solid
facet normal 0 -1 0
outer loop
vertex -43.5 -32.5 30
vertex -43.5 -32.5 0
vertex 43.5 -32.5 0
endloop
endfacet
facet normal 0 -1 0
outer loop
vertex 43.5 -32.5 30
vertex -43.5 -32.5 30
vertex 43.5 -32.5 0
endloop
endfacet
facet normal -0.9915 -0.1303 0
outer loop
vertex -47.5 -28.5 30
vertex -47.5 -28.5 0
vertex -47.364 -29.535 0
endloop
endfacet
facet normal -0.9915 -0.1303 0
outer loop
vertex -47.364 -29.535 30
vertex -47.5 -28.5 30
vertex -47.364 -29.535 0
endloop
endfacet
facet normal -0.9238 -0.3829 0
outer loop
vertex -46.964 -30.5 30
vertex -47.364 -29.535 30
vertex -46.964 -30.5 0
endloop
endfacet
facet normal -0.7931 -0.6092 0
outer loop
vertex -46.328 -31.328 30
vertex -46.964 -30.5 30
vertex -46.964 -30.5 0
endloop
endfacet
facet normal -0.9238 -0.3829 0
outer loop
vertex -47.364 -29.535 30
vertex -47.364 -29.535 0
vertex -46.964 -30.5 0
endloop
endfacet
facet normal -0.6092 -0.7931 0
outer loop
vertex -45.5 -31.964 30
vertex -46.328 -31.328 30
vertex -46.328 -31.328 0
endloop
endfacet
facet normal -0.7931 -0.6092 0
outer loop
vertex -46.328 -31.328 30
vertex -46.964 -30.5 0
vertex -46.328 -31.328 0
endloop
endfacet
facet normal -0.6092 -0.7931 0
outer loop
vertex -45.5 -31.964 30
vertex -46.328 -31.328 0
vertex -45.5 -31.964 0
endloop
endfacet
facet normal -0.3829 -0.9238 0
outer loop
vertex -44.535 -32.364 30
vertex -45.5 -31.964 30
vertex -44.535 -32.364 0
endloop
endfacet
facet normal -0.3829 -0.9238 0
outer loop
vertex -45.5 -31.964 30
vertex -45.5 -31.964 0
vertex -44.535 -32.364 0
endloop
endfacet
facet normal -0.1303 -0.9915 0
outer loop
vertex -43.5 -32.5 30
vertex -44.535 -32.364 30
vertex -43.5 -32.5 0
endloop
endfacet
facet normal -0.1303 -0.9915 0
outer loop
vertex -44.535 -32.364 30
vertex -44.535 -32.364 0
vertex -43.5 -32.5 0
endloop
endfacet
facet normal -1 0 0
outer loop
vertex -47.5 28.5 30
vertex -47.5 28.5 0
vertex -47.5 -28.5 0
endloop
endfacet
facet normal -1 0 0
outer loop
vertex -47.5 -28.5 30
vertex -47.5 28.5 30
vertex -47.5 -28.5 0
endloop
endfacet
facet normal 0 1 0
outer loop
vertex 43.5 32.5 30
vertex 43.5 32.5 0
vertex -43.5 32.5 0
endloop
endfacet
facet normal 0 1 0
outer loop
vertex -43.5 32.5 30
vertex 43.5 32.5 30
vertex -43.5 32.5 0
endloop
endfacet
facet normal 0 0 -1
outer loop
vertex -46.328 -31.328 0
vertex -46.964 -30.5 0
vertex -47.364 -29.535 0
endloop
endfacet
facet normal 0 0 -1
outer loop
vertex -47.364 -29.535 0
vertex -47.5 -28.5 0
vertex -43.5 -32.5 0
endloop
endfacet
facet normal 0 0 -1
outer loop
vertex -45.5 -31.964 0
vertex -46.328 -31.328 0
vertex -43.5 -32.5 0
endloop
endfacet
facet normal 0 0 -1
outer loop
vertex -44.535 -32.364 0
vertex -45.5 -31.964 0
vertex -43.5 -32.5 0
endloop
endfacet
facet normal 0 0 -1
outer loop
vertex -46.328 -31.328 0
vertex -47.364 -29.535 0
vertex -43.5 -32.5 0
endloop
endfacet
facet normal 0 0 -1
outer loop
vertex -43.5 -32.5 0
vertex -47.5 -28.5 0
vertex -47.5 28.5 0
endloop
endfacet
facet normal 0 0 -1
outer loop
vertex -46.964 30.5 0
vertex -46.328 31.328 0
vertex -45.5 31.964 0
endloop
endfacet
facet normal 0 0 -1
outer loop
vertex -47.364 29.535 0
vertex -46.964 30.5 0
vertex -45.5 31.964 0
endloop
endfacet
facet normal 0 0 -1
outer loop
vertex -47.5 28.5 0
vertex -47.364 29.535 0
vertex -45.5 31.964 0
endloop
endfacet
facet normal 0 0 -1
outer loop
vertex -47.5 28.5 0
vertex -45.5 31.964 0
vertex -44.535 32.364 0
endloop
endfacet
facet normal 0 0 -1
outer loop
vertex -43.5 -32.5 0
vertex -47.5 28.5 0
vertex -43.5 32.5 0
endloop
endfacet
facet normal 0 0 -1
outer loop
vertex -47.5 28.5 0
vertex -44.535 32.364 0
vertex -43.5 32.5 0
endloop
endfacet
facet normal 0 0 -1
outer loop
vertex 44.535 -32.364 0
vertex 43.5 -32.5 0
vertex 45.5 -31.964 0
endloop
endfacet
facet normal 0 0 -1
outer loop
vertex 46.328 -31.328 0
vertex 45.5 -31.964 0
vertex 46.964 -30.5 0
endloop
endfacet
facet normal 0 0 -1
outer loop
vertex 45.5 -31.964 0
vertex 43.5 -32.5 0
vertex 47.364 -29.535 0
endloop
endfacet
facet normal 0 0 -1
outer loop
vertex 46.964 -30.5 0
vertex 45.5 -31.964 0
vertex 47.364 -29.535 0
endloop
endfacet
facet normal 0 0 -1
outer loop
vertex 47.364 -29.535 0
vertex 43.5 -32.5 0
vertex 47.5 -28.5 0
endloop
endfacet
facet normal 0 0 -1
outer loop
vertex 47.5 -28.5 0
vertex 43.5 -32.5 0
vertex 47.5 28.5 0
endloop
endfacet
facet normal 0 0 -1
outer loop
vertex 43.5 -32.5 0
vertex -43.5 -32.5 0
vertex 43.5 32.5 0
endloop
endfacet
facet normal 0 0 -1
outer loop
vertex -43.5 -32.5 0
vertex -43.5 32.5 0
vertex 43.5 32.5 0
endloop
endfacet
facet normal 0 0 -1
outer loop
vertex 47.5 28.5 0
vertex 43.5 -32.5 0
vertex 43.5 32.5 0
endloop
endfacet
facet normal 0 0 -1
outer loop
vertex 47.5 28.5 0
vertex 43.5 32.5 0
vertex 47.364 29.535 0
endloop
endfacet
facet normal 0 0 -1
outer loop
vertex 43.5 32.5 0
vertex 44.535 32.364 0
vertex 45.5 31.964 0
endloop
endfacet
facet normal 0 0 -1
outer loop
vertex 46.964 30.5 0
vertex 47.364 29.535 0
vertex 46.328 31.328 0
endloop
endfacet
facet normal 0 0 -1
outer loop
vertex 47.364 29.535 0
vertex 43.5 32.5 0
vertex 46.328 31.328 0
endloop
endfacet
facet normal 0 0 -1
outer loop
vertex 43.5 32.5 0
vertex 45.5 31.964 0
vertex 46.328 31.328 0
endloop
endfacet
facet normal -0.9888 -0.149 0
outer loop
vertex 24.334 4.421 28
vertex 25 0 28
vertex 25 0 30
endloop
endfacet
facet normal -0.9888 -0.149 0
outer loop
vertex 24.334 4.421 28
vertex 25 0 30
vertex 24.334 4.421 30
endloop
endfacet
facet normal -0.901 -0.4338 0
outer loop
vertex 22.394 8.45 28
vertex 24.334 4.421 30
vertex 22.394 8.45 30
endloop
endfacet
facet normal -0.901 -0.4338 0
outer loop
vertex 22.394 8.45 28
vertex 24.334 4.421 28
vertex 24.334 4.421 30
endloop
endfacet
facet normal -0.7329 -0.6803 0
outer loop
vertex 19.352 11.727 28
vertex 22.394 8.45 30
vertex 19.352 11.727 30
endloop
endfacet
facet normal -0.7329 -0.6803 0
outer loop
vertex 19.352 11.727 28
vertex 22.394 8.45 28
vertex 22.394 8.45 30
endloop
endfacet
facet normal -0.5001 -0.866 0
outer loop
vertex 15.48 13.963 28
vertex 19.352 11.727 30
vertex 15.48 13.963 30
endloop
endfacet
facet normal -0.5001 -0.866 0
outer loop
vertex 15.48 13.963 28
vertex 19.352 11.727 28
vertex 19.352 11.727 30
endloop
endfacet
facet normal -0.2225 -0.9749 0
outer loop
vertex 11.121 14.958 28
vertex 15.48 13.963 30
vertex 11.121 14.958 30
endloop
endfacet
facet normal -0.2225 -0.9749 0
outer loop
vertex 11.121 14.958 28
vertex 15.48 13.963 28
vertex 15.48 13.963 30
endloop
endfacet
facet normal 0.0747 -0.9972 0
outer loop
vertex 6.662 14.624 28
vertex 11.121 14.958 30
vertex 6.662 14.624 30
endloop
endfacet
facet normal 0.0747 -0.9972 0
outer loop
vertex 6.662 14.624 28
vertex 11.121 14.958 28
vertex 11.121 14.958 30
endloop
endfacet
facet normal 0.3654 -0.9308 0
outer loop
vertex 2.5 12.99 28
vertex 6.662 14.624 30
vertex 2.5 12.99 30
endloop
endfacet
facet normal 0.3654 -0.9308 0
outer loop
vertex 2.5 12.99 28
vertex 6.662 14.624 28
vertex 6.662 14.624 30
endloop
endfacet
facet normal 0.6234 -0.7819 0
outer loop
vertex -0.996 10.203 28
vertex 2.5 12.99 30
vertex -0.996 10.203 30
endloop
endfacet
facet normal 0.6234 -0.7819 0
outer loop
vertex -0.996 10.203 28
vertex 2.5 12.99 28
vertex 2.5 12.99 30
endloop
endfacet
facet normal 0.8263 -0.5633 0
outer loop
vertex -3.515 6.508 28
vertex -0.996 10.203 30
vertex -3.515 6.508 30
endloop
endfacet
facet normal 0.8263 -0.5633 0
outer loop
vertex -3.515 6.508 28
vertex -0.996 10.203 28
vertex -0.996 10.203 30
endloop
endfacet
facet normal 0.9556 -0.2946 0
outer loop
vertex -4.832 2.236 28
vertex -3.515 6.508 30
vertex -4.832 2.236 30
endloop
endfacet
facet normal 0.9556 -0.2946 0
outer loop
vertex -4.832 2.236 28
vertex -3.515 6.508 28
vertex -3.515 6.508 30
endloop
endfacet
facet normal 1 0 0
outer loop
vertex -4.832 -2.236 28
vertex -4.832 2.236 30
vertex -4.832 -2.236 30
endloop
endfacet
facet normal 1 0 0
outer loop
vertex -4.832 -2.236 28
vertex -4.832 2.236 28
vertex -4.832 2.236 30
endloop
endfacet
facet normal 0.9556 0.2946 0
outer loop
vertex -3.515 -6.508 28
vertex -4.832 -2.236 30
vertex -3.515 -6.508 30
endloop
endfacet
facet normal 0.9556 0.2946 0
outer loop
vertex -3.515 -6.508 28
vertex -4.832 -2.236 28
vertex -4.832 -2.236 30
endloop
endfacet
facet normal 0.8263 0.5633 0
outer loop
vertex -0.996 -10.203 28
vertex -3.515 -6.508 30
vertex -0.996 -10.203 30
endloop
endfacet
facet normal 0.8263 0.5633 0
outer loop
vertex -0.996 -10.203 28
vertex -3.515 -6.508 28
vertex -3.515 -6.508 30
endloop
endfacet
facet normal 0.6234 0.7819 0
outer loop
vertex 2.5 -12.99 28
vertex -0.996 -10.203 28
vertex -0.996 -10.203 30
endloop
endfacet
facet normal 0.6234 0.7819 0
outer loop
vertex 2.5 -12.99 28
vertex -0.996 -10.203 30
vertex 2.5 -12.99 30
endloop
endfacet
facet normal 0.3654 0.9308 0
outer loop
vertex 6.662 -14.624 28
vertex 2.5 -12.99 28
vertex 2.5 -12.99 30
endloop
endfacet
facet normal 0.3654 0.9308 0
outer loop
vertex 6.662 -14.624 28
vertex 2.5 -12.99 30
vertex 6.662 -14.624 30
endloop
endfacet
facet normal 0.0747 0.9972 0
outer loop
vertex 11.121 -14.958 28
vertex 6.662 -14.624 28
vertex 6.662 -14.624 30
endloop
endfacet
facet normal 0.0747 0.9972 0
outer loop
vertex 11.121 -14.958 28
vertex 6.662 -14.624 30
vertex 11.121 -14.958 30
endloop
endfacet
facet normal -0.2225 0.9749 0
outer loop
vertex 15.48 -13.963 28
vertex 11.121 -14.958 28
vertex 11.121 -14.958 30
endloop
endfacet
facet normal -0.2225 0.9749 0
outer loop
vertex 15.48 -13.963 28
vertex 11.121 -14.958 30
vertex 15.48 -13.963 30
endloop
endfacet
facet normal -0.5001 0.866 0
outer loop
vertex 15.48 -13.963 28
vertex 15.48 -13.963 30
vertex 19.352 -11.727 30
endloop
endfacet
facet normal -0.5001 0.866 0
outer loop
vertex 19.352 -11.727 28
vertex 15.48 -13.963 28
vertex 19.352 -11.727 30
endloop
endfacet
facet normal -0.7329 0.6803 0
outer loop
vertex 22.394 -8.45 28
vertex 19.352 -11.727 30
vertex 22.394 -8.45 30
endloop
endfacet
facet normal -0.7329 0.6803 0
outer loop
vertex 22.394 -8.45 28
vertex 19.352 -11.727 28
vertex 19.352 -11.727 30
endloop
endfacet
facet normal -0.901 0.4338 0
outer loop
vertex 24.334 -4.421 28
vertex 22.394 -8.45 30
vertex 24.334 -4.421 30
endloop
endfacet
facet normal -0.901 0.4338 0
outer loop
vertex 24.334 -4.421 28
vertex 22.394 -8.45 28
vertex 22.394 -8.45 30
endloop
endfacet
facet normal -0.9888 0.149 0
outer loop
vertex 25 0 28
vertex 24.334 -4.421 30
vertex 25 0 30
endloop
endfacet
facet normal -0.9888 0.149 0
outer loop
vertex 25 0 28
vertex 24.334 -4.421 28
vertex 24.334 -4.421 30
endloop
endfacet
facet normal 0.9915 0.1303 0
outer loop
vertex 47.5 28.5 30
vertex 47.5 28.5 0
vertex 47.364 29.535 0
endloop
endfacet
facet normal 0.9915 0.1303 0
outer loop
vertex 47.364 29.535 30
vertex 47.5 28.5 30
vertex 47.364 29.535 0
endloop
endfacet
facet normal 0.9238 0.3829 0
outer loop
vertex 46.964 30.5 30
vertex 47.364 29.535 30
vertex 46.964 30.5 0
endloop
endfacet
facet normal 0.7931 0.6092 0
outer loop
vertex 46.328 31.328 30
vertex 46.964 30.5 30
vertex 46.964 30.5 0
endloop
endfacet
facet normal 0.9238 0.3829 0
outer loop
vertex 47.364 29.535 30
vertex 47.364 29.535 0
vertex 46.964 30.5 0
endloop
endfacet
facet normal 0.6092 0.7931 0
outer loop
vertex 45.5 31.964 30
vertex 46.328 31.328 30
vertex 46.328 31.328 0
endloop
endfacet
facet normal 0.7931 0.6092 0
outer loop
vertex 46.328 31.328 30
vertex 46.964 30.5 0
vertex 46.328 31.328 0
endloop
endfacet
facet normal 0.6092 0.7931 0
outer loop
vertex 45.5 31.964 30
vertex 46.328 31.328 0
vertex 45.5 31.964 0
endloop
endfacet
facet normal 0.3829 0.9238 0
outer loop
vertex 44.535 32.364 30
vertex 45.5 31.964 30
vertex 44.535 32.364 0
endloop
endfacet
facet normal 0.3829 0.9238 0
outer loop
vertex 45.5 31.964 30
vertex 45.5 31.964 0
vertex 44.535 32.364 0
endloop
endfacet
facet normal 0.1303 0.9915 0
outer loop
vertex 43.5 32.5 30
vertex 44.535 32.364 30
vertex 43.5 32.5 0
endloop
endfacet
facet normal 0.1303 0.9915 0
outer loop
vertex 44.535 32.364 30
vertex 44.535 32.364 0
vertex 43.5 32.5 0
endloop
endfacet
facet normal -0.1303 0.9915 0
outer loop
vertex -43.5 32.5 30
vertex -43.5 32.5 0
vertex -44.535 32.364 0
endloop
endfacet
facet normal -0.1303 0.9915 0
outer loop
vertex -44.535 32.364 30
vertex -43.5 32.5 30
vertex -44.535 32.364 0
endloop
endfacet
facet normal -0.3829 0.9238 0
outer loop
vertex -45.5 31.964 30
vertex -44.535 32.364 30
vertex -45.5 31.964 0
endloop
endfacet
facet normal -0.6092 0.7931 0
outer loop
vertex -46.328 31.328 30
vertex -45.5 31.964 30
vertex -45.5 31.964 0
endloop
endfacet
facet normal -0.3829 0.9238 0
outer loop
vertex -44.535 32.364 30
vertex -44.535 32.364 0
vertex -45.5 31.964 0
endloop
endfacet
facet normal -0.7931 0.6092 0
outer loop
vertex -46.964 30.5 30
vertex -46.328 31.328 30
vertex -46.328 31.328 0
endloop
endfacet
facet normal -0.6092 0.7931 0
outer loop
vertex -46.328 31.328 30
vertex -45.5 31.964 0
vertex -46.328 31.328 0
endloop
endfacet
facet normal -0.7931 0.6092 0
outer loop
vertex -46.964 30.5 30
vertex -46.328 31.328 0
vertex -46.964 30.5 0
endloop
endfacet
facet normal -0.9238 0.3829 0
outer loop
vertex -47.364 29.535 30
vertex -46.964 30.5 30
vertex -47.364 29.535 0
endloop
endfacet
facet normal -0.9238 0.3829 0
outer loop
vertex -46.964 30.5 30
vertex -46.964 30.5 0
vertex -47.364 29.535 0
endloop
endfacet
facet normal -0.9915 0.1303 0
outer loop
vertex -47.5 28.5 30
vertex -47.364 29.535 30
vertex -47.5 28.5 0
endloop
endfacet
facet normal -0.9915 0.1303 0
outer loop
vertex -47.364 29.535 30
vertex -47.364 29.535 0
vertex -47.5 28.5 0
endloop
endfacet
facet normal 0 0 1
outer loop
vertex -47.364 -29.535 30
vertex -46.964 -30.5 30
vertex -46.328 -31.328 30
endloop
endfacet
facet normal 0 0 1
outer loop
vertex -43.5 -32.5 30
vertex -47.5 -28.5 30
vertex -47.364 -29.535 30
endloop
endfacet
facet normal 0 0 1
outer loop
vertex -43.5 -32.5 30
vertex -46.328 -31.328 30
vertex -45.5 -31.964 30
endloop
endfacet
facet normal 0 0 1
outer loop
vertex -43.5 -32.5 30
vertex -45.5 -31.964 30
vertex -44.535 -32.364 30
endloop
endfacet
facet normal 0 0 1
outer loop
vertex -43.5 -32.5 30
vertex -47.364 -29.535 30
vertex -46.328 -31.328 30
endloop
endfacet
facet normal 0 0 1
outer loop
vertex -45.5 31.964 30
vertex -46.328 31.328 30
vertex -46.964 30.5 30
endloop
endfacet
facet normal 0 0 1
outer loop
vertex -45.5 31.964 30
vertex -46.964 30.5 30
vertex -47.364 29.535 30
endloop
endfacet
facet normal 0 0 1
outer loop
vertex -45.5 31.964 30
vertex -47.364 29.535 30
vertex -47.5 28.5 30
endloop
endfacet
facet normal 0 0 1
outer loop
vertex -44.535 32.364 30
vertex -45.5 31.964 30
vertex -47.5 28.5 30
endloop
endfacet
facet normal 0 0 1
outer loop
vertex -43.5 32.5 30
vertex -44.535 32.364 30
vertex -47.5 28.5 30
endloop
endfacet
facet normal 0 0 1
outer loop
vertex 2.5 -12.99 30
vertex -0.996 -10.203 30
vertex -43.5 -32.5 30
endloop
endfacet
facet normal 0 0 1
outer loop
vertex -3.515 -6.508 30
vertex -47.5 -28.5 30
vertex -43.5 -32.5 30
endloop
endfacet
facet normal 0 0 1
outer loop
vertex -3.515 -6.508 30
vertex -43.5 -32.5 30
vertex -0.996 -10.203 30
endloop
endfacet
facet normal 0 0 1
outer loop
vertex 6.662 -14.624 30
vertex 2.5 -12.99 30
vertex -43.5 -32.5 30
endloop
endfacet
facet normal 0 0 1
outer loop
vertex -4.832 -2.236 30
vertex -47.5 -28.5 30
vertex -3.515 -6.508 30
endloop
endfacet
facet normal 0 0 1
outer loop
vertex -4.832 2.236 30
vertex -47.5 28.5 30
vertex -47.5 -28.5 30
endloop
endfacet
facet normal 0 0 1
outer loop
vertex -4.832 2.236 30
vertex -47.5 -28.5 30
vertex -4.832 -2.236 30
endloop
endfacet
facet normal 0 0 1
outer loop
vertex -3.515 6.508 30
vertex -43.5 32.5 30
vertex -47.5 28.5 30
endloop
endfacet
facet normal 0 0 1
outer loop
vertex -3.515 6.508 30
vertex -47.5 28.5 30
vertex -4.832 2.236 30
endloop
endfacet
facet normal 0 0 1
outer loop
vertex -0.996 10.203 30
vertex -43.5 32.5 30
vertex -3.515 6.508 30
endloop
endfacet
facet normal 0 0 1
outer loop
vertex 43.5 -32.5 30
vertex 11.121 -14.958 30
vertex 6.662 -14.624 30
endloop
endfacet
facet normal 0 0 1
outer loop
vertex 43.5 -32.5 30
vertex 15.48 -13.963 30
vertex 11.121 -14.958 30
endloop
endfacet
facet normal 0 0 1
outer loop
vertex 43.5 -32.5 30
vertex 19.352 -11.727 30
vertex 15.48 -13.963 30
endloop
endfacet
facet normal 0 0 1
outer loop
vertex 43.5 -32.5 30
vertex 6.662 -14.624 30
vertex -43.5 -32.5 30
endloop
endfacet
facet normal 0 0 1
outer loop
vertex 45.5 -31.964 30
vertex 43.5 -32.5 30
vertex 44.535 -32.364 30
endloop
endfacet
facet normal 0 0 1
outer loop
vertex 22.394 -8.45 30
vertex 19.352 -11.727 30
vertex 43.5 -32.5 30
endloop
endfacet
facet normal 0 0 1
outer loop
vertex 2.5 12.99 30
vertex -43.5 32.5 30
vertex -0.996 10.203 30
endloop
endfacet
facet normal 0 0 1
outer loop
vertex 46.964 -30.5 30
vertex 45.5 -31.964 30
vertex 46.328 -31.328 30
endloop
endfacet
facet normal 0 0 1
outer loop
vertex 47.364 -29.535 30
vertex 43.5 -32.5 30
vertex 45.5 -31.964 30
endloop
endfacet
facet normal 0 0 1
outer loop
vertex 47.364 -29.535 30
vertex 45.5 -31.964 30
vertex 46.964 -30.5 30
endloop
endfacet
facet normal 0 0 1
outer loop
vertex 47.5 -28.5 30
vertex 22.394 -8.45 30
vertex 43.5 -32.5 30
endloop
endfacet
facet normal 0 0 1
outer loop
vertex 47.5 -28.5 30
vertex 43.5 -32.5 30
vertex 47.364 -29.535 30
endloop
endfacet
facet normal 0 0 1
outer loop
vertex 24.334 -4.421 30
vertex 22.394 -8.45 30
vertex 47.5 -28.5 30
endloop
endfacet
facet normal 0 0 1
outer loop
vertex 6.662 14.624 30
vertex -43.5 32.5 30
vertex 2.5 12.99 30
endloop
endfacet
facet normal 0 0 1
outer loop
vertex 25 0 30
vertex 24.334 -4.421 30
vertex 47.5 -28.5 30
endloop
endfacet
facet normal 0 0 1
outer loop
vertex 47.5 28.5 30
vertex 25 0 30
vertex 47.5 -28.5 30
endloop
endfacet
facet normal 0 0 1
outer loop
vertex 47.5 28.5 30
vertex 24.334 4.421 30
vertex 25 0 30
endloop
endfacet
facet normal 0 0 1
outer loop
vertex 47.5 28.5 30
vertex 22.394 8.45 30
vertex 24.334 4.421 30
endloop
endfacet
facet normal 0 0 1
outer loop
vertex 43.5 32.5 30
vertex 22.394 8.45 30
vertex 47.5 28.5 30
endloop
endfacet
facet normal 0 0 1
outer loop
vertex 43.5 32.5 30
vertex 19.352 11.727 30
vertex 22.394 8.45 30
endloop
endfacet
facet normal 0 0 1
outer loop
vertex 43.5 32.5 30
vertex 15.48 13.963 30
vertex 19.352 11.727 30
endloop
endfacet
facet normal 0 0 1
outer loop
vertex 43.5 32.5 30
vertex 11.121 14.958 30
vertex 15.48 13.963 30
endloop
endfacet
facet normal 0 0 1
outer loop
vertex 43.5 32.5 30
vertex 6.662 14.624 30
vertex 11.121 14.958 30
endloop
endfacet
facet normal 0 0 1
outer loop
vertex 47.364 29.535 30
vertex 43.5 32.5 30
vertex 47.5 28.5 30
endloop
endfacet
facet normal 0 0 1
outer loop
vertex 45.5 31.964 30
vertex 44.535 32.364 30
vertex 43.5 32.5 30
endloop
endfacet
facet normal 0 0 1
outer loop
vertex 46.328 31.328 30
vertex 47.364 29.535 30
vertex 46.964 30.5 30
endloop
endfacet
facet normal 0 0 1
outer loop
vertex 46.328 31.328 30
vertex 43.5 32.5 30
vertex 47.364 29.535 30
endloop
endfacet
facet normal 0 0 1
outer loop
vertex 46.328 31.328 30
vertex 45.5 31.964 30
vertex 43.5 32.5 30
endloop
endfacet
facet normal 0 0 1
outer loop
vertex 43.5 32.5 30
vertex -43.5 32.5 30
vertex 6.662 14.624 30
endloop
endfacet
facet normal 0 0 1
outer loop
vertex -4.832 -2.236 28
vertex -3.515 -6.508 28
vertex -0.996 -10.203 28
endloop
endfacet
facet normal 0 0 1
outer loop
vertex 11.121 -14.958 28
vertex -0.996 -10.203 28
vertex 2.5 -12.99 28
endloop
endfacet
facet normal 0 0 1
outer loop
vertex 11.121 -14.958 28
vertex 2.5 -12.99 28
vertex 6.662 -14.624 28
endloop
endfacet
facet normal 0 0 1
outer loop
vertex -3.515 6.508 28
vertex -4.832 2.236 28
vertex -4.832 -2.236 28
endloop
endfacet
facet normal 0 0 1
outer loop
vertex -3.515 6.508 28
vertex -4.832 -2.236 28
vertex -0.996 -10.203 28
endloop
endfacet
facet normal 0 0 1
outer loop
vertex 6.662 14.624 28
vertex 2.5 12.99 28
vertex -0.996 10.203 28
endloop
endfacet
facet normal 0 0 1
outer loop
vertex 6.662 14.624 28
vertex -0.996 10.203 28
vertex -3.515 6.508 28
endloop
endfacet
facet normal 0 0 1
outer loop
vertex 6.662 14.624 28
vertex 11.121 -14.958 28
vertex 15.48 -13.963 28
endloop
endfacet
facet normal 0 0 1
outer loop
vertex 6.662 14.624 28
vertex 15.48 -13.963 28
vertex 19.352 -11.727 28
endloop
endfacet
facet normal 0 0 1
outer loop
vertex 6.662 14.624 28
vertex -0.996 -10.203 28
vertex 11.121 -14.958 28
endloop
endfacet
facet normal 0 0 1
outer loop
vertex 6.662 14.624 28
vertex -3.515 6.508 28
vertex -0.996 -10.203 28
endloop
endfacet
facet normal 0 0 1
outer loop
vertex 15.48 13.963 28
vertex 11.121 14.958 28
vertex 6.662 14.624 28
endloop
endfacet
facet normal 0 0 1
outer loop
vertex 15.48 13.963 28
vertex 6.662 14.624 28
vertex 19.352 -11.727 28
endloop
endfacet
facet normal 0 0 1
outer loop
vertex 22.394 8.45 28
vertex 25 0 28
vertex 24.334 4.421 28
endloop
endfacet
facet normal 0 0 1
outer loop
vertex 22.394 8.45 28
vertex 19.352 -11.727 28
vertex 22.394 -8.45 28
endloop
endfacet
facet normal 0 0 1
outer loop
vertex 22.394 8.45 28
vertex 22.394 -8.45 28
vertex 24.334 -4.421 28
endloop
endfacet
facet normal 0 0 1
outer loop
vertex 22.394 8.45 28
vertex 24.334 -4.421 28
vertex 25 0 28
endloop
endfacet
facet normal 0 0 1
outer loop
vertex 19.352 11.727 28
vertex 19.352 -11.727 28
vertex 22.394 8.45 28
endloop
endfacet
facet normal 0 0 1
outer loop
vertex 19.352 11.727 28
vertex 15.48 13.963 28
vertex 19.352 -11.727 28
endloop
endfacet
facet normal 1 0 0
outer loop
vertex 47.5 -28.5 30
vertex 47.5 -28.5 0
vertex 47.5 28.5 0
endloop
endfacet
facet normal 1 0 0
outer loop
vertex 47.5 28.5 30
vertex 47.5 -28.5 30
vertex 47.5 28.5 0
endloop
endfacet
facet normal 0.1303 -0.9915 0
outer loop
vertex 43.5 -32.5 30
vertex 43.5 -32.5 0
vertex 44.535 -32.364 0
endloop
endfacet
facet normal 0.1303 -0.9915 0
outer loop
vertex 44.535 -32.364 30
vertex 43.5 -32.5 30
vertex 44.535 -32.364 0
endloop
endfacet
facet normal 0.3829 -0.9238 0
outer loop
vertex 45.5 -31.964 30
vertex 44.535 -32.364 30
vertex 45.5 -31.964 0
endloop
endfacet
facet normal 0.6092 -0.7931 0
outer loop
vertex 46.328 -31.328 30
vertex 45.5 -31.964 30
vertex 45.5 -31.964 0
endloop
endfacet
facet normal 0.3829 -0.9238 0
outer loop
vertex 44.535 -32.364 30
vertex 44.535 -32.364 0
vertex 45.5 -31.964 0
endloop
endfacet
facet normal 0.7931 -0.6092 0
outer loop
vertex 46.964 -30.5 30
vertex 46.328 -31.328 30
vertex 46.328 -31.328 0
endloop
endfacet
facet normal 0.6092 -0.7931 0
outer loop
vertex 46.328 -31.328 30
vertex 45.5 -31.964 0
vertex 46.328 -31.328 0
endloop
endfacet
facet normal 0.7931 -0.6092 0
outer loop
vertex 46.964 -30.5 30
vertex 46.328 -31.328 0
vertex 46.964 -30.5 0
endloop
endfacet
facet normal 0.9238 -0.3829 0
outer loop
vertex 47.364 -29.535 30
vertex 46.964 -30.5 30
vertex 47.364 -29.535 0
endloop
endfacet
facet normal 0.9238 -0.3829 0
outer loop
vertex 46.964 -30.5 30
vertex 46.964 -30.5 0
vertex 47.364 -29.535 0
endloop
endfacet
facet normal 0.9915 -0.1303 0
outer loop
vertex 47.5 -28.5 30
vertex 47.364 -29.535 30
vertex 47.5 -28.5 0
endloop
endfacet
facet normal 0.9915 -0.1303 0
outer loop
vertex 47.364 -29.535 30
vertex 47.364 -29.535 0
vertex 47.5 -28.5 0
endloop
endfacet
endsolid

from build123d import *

# Parameters (mm, degrees)
ENVOLVENTE_95X65X30_DEPTH = 30
VENTILADOR_START          = 28
CROQUIS2_R                = 15
VENTILADOR_DEPTH          = 2


with BuildPart() as part:
    # Croquis1 → Envolvente_95x65x30 (new body)
    with BuildSketch(Plane.XY):
        with BuildLine():
            Line((-43.5, -32.5), (43.5, -32.5))
            ThreePointArc((43.5, -32.5), (46.328427125, -31.328427125), (47.5, -28.5))
            Line((47.5, -28.5), (47.5, 28.5))
            ThreePointArc((47.5, 28.5), (46.328427125, 31.328427125), (43.5, 32.5))
            Line((43.5, 32.5), (-43.5, 32.5))
            ThreePointArc((-43.5, 32.5), (-46.328427125, 31.328427125), (-47.5, 28.5))
            Line((-47.5, 28.5), (-47.5, -28.5))
            ThreePointArc((-47.5, -28.5), (-46.328427125, -31.328427125), (-43.5, -32.5))
        make_face()
    extrude(amount=ENVOLVENTE_95X65X30_DEPTH)

    # Croquis2 → Ventilador (cut)
    with BuildSketch(Plane.XY.offset(VENTILADOR_START)):
        with Locations((10, 0)):
            Circle(CROQUIS2_R)
    extrude(amount=VENTILADOR_DEPTH, mode=Mode.SUBTRACT)


solid = part.part
